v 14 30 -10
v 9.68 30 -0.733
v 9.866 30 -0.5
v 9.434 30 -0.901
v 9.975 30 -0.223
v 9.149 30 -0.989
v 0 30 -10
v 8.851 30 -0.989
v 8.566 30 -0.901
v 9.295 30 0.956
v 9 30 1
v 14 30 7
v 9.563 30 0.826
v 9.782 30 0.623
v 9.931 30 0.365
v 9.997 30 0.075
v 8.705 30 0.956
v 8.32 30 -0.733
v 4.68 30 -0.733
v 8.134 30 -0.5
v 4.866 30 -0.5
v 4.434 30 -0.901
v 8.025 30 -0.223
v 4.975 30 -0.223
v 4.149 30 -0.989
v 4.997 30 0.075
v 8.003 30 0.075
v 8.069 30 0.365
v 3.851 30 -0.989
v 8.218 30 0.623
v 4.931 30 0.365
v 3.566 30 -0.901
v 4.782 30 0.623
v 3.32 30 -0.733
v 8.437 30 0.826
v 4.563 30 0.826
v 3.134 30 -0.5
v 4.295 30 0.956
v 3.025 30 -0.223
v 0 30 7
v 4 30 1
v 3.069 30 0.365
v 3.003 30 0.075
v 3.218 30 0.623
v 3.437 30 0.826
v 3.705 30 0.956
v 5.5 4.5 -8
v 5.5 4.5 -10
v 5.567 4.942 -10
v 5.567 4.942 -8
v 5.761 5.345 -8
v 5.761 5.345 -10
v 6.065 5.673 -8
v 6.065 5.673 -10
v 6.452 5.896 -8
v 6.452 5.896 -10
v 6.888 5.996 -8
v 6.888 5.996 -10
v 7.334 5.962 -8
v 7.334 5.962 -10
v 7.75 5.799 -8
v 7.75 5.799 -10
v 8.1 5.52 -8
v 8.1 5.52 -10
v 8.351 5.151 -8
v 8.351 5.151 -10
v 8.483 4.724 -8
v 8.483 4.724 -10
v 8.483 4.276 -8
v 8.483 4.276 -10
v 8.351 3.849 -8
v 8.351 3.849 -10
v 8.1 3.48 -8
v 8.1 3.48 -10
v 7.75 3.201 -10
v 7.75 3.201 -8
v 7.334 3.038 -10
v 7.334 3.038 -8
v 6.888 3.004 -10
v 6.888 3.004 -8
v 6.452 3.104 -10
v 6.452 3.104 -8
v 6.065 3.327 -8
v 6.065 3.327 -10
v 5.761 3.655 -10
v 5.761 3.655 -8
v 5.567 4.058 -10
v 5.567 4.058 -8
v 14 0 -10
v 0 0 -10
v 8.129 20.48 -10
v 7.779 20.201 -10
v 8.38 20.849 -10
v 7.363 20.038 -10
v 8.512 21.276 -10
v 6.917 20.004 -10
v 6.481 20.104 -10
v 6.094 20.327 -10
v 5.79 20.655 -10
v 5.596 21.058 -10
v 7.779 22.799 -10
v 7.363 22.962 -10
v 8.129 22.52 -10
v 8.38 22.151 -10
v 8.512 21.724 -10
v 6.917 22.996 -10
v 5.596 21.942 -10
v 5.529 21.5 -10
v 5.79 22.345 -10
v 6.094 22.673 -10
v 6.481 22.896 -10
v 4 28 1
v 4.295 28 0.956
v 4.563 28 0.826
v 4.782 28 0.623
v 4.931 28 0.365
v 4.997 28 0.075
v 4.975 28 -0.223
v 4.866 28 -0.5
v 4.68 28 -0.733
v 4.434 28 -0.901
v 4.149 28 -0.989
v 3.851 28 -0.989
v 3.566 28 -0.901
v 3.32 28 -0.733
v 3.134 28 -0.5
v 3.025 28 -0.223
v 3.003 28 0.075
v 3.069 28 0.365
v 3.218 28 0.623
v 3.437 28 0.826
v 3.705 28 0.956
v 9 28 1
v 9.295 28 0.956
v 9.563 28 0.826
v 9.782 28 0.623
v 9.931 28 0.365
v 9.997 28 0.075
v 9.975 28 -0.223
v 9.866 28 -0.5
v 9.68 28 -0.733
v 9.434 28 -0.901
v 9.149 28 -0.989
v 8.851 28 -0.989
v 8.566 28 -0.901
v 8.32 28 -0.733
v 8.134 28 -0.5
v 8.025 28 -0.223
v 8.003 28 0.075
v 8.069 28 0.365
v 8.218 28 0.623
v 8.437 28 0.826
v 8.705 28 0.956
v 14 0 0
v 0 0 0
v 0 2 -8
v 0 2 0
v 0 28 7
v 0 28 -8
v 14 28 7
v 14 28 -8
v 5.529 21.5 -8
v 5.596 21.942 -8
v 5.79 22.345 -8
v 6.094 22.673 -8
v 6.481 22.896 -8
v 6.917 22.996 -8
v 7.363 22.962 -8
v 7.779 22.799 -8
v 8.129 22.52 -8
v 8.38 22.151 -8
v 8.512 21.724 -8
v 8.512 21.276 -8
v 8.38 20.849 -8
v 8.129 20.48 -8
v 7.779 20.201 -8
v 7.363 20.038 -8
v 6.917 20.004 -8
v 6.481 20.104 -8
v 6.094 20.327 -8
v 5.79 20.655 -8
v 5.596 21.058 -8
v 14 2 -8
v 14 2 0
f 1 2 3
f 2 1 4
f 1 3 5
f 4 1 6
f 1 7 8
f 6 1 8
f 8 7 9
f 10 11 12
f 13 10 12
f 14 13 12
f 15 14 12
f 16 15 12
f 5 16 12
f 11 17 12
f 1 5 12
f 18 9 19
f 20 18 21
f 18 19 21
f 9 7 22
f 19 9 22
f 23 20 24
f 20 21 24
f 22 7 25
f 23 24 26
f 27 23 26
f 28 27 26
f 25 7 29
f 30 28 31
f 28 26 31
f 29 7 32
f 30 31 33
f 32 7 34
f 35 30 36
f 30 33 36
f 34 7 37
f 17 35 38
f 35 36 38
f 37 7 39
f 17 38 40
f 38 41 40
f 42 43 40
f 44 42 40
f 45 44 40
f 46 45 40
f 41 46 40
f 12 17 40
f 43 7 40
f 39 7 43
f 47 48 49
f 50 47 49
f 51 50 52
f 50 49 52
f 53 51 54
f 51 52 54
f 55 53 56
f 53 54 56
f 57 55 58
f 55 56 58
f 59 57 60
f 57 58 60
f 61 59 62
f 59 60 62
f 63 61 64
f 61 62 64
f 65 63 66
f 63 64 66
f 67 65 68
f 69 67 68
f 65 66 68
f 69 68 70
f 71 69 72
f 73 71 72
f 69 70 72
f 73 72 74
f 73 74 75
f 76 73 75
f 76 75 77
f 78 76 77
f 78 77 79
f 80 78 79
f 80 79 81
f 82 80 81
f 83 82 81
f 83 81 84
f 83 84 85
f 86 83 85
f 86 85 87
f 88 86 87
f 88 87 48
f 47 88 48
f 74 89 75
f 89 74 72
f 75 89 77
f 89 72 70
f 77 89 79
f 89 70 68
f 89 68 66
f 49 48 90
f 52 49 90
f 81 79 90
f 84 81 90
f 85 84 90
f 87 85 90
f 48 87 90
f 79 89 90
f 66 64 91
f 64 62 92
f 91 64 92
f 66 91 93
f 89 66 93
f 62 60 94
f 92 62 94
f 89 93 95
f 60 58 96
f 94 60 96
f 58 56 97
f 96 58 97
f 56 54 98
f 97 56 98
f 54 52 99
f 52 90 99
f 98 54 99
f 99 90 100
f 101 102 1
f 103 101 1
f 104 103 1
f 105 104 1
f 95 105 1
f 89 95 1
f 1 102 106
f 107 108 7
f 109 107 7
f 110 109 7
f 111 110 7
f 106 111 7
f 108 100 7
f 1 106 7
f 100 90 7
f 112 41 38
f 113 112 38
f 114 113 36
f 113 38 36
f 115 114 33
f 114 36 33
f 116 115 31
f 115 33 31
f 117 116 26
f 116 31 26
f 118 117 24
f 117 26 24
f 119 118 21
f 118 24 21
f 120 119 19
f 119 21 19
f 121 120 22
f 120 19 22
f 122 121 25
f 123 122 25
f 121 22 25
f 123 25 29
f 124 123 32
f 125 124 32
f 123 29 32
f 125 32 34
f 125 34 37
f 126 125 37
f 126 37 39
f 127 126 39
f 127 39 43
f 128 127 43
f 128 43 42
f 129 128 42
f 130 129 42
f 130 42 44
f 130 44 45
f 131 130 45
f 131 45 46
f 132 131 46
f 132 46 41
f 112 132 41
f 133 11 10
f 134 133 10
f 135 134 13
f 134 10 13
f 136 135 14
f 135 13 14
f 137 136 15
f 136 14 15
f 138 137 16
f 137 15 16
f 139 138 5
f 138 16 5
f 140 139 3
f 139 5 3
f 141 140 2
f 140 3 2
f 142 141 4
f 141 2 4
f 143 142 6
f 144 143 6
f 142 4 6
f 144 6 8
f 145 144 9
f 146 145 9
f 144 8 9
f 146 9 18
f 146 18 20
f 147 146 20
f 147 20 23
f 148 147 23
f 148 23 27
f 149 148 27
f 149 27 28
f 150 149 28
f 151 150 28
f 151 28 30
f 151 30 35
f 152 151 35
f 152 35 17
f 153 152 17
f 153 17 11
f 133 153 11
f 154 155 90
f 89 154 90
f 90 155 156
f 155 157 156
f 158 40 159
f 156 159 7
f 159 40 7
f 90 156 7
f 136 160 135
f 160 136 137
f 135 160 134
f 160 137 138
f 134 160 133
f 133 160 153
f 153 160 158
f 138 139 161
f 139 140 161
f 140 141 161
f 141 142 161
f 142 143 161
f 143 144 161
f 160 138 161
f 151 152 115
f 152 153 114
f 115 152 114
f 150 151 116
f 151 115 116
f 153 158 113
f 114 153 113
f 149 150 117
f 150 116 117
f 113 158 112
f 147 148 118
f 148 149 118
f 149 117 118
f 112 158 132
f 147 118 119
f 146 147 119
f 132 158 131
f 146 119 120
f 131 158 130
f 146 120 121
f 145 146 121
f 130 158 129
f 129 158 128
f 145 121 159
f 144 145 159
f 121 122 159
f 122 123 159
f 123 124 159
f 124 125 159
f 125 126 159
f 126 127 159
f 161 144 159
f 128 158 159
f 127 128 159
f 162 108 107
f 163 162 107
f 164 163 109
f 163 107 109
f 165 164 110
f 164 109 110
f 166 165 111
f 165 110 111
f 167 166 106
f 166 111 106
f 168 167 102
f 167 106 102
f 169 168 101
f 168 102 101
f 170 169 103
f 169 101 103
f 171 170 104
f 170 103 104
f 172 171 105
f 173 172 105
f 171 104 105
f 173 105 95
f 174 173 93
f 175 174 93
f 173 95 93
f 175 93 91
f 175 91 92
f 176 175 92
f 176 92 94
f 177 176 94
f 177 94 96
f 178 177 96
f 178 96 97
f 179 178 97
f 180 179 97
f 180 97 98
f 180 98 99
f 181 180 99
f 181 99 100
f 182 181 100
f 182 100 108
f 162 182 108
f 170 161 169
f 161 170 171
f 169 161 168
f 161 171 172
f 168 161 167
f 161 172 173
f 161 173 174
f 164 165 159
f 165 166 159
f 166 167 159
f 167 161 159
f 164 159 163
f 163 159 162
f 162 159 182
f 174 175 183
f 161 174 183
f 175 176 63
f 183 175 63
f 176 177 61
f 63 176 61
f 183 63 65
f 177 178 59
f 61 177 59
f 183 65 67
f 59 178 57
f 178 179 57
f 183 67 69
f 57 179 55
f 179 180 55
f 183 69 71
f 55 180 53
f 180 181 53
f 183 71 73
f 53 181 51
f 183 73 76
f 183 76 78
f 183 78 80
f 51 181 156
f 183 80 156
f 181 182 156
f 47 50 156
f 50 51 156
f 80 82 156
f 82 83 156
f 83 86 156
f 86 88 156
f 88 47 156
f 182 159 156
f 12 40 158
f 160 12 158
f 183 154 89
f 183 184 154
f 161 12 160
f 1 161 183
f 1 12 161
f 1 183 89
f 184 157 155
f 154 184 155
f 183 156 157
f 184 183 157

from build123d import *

# Parameters (mm, degrees)
EXTRUDE_1_DEPTH     = 14
SKETCH_5_R          = 1.5
CUT_EXTRUDE_1_DEPTH = 14
SKETCH_6_R          = 1
CUT_EXTRUDE_2_DEPTH = 14


with BuildPart() as part:
    # 草图1 → 凸台-拉伸1 (new body)
    with BuildSketch(Plane(origin=(0, 0, 0), x_dir=(0, 0, -1), z_dir=(1, 0, 0))):
        Polygon((0, 0), (10, 0), (10, 30), (-7, 30), (-7, 28), (8, 28), (8, 2), (0, 2), align=None)
    extrude(amount=EXTRUDE_1_DEPTH)

    # 草图5 → 切除-拉伸1 (cut)
    with BuildSketch(Plane(origin=(0, 0, -10), x_dir=(-1, 0, 0), z_dir=(0, 0, -1))):
        with Locations((-7.028963354, 21.5)):
            Circle(SKETCH_5_R)
        with Locations((-7, 4.5)):
            Circle(SKETCH_5_R)
    extrude(amount=-CUT_EXTRUDE_1_DEPTH, mode=Mode.SUBTRACT)

    # 草图6 → 切除-拉伸2 (cut)
    with BuildSketch(Plane(origin=(0, 30, 0), x_dir=(1, 0, 0), z_dir=(0, 1, 0))):
        with Locations(Location((4, 0, 0), (0, 0, 270))):
            Circle(SKETCH_6_R)
        with Locations(Location((9, 0, 0), (0, 0, 270))):
            Circle(SKETCH_6_R)
    extrude(amount=-CUT_EXTRUDE_2_DEPTH, mode=Mode.SUBTRACT)


solid = part.part
